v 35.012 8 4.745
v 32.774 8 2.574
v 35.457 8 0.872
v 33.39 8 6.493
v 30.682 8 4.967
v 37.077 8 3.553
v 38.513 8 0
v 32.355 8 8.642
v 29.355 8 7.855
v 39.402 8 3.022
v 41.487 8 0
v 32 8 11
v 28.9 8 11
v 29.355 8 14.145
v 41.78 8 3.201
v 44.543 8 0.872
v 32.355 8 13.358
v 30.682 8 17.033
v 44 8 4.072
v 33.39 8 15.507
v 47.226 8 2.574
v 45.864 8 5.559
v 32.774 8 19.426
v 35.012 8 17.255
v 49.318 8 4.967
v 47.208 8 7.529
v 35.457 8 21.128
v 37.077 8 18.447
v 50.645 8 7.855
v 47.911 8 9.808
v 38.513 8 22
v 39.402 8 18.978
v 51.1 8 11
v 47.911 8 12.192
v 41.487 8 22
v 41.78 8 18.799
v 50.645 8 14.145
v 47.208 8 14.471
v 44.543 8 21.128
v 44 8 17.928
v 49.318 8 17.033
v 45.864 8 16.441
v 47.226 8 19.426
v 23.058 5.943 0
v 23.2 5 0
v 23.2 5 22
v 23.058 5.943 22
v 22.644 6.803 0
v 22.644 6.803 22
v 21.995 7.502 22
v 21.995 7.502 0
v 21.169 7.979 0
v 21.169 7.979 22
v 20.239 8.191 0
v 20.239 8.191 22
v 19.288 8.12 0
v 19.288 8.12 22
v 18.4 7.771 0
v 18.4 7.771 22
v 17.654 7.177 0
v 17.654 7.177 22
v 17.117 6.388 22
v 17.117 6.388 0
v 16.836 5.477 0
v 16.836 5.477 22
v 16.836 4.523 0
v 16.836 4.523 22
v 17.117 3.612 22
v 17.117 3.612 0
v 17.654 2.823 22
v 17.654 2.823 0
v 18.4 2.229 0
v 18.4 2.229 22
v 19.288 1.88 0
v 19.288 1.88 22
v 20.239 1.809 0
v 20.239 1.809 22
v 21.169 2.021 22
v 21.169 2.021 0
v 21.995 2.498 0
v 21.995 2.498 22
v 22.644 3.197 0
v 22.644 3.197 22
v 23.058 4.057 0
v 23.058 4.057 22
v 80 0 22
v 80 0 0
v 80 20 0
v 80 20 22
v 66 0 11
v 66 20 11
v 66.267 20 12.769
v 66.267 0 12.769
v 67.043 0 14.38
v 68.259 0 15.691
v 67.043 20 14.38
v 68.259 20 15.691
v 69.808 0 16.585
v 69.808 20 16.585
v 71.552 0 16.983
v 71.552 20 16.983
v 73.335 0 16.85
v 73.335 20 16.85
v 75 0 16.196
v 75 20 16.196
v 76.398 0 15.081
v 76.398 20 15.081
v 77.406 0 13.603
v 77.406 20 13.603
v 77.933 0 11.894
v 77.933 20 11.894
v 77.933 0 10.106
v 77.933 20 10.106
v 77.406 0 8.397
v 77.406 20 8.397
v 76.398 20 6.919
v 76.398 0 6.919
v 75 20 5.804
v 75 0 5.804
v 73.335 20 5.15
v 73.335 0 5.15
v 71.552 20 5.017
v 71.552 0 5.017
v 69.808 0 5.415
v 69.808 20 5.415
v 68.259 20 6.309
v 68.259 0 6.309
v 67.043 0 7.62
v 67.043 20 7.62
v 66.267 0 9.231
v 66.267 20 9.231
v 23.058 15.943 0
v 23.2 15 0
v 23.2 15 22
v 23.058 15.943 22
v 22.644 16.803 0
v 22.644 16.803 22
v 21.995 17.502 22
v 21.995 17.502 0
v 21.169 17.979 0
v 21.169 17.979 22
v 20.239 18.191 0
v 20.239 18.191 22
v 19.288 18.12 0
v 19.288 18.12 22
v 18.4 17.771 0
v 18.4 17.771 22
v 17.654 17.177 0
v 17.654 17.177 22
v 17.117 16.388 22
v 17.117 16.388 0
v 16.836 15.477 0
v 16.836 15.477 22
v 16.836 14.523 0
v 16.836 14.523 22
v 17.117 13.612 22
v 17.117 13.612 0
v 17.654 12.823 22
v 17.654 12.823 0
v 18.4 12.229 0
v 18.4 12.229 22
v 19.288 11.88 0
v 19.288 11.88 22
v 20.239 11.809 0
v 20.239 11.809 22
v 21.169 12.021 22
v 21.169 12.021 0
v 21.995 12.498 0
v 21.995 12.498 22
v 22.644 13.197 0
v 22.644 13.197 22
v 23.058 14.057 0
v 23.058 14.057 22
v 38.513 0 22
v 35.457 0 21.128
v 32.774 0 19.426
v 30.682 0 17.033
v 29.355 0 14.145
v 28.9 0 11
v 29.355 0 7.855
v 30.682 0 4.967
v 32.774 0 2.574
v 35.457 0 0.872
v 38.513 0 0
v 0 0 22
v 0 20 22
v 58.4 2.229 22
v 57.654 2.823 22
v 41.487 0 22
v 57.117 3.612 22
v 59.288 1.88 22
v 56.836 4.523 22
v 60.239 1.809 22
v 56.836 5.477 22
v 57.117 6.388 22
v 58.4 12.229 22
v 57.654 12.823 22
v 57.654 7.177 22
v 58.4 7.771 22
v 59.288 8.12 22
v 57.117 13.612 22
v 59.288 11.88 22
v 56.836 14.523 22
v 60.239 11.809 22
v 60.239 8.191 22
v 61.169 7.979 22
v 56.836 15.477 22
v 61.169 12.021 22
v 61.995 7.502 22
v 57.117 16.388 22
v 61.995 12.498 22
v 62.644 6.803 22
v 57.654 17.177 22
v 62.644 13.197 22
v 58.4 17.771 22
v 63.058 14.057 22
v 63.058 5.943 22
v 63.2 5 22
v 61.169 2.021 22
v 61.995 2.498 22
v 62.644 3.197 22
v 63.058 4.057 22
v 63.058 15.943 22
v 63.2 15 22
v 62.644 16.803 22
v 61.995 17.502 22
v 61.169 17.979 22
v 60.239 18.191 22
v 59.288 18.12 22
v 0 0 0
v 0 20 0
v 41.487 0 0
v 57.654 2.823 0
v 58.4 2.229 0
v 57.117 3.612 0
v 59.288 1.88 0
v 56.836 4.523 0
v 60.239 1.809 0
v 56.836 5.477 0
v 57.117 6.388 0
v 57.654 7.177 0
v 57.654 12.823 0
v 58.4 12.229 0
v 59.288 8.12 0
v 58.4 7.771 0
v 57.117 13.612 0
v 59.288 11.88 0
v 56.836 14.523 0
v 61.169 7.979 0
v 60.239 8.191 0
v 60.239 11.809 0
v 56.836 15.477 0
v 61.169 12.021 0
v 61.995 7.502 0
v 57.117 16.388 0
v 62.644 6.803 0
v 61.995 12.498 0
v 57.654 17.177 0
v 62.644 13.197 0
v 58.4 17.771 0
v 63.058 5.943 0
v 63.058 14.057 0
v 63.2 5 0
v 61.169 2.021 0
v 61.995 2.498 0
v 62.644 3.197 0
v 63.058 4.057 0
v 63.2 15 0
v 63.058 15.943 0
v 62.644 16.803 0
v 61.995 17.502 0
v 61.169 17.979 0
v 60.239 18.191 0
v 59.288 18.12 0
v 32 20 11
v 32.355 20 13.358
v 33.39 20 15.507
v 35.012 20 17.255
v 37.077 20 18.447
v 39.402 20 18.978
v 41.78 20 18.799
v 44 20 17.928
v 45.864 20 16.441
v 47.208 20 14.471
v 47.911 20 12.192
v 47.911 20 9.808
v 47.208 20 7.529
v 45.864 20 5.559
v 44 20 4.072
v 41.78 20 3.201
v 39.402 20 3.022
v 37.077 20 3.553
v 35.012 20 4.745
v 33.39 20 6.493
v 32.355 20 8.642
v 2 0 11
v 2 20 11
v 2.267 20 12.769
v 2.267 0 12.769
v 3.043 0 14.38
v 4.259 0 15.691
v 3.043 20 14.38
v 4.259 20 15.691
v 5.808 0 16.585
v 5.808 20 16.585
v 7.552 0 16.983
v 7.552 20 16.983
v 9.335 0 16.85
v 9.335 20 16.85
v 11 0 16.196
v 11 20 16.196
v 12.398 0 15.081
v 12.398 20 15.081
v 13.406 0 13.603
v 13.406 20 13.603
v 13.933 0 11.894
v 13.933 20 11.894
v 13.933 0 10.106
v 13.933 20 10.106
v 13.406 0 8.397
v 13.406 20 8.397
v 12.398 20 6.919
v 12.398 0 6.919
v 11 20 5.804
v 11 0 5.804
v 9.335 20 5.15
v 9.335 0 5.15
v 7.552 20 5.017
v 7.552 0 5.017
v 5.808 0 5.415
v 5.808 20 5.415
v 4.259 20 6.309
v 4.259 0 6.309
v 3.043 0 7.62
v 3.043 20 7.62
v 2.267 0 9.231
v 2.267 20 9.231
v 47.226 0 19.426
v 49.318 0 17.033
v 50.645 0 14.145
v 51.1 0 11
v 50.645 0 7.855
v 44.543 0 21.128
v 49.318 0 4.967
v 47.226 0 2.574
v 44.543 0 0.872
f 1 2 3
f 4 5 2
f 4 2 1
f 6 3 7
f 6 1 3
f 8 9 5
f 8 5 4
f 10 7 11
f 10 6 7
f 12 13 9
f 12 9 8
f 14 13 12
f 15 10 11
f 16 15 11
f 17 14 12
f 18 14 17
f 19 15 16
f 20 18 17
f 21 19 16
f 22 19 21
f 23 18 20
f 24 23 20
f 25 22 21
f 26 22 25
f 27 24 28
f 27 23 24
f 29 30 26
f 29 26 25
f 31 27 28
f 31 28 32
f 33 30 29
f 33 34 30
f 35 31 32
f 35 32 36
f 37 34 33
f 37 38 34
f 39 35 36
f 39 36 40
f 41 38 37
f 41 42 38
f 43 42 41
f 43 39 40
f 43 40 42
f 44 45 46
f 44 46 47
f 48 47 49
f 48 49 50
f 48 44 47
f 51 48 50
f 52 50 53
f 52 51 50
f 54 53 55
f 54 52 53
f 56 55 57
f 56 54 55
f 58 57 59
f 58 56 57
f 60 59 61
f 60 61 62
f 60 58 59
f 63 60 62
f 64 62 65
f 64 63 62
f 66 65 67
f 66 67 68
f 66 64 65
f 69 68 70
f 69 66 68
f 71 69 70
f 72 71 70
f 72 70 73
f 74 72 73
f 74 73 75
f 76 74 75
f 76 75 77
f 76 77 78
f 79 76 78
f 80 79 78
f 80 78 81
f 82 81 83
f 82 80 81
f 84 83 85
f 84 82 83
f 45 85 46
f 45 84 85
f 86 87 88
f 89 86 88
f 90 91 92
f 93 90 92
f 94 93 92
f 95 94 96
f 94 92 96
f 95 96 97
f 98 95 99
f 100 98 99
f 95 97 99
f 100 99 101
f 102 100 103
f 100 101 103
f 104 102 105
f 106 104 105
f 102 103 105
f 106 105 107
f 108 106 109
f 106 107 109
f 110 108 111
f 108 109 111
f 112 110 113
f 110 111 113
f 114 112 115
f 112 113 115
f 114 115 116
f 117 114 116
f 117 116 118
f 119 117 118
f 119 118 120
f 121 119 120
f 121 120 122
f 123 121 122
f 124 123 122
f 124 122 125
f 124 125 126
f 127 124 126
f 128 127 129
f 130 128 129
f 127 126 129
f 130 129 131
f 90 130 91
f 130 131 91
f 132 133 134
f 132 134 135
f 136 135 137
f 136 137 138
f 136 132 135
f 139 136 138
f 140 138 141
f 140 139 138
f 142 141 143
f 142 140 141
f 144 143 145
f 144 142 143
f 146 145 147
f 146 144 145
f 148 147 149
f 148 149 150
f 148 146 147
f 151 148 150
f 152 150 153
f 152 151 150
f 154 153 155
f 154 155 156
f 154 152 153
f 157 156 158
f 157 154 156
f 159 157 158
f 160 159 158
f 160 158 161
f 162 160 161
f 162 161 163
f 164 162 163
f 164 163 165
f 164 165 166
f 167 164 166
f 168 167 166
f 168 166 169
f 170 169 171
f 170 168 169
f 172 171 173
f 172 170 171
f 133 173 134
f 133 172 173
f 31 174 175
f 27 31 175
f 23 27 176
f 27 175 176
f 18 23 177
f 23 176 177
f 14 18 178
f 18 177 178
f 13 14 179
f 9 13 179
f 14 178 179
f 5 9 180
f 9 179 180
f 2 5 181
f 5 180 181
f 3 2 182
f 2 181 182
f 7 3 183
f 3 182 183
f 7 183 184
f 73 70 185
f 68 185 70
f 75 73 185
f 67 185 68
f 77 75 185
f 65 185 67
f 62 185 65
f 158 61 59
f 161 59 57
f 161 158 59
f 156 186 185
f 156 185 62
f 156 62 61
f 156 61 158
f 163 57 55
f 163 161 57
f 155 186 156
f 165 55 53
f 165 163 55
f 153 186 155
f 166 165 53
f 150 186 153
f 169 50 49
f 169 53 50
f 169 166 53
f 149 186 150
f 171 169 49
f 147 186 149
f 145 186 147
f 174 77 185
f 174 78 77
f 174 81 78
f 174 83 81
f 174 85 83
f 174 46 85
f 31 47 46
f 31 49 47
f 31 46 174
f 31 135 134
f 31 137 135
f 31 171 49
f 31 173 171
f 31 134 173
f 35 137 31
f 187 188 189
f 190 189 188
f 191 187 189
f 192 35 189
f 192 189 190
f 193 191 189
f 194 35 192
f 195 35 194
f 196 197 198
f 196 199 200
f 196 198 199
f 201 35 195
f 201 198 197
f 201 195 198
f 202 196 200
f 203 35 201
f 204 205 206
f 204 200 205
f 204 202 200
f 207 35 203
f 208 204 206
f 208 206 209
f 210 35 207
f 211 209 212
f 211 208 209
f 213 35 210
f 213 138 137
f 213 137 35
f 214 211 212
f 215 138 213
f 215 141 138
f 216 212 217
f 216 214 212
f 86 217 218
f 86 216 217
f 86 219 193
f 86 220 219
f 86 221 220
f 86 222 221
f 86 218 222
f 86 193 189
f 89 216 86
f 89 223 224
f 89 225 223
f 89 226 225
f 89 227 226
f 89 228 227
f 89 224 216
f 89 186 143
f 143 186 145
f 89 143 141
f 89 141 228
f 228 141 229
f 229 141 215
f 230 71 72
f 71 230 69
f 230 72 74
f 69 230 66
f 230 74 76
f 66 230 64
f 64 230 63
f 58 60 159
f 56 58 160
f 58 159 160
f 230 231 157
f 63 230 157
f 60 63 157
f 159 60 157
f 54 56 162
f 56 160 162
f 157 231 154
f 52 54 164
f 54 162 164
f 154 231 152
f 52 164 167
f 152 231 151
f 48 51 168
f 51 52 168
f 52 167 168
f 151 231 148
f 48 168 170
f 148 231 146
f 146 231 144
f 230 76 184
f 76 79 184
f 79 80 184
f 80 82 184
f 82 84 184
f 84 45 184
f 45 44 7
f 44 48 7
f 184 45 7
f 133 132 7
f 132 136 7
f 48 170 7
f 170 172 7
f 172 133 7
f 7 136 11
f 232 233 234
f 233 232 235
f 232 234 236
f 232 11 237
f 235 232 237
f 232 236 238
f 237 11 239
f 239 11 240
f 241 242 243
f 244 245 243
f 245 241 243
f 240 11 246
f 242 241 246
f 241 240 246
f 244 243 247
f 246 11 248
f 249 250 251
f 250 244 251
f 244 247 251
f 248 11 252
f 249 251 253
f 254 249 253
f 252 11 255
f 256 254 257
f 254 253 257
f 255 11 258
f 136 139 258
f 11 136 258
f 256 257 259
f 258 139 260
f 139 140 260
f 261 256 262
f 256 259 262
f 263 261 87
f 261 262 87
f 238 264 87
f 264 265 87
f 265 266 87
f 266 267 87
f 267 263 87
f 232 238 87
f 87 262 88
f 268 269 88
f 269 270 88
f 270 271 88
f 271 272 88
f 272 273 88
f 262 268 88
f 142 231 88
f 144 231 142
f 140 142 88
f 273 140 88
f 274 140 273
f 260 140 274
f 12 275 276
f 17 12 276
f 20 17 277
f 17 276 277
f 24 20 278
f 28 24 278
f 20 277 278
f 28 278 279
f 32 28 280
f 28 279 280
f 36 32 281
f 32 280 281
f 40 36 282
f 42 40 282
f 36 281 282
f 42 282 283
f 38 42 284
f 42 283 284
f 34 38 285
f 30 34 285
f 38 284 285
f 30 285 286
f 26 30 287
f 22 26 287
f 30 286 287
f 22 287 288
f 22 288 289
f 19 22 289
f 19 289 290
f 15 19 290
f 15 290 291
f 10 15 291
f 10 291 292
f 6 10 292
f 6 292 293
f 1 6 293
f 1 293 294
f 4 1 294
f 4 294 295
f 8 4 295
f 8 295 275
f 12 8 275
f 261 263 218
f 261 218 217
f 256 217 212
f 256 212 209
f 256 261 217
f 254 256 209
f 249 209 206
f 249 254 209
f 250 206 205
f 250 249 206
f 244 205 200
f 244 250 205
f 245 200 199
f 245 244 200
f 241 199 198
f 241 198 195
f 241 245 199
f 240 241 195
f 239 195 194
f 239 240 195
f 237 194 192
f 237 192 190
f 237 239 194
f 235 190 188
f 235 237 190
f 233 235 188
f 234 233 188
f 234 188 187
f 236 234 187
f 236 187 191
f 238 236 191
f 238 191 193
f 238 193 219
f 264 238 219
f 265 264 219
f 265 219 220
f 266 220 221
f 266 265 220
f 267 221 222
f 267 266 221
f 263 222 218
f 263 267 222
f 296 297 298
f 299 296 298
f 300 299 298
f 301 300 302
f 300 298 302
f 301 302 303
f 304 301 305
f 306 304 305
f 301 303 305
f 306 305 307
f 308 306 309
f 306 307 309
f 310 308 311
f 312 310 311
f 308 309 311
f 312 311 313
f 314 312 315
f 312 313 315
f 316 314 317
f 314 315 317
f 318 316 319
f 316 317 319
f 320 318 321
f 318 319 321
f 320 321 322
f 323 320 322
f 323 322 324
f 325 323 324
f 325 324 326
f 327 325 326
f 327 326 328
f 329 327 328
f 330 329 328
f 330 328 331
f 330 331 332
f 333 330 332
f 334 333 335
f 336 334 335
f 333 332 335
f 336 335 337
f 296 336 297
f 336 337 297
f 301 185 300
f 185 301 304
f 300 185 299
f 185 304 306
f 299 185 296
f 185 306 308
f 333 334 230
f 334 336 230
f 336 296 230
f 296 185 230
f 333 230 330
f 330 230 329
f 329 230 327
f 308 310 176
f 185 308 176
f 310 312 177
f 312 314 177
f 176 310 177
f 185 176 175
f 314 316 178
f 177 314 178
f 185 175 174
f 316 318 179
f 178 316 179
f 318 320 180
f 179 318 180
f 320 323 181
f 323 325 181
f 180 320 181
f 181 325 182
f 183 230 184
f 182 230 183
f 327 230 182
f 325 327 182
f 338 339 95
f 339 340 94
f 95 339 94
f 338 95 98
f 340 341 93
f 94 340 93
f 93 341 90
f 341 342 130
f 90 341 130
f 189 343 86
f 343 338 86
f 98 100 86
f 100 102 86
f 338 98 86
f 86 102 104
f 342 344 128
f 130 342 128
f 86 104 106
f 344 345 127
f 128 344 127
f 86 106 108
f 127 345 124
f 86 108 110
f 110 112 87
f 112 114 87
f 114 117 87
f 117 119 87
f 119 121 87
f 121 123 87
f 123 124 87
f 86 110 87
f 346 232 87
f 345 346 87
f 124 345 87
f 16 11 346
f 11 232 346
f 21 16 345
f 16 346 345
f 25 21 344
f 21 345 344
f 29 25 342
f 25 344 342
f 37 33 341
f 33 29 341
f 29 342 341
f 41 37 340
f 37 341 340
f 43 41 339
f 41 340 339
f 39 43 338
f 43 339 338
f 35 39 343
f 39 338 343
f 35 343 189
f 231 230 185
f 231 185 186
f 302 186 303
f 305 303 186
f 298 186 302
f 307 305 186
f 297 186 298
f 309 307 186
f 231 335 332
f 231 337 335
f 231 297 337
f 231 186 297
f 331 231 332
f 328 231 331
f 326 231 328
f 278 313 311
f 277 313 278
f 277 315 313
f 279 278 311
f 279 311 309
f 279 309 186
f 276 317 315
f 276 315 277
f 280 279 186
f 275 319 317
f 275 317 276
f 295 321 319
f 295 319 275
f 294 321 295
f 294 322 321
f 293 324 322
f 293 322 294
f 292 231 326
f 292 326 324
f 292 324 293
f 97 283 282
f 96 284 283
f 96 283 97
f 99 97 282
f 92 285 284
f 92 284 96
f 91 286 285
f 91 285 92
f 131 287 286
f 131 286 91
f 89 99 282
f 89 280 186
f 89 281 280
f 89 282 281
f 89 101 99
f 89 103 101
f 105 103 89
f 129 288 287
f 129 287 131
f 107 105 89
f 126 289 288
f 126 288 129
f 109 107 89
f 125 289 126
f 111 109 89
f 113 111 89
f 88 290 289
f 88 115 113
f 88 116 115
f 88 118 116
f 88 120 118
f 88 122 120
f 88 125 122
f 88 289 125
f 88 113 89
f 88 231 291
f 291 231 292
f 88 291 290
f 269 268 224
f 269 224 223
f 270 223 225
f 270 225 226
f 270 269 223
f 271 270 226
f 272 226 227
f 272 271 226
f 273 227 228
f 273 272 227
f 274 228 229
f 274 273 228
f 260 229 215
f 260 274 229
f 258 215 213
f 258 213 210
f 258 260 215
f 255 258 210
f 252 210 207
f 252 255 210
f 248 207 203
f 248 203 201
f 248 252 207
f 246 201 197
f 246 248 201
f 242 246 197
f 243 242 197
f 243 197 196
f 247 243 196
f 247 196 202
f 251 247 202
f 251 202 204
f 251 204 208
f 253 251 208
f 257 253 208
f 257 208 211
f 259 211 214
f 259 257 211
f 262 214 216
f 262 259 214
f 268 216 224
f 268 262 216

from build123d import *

# Parameters (mm, degrees)
SKETCH_W        = 80
SKETCH_H        = 20
SKETCH_R        = 3.2
PAD_DEPTH       = 22
SKETCH001_R     = 11.1
POCKET_DEPTH    = 8
SKETCH002_R     = 6
SKETCH002_R_2   = 8
POCKET001_DEPTH = 20


with BuildPart() as part:
    # Sketch → Pad (new body)
    with BuildSketch(Plane.XY):
        with Locations((40, 10)):
            Rectangle(SKETCH_W, SKETCH_H)
        with Locations((20, 15)):
            Circle(SKETCH_R, mode=Mode.SUBTRACT)
        with Locations((20, 5)):
            Circle(SKETCH_R, mode=Mode.SUBTRACT)
        with Locations((60, 15)):
            Circle(SKETCH_R, mode=Mode.SUBTRACT)
        with Locations((60, 5)):
            Circle(SKETCH_R, mode=Mode.SUBTRACT)
    extrude(amount=PAD_DEPTH)

    # Sketch001 (on Face3 of Pad) → Pocket (cut)
    with BuildSketch(Plane.XZ):
        with Locations((40, 11)):
            Circle(SKETCH001_R)
    extrude(amount=-POCKET_DEPTH, mode=Mode.SUBTRACT)

    # Sketch002 (on Face1 of Pocket) → Pocket001 (cut)
    with BuildSketch(Plane(origin=(0, 20, 0), x_dir=(-1, 0, 0), z_dir=(0, 1, 0))):
        with Locations((-72, 11)):
            Circle(SKETCH002_R)
        with Locations((-8, 11)):
            Circle(SKETCH002_R)
        with Locations((-40, 11)):
            Circle(SKETCH002_R_2)
    extrude(amount=-POCKET001_DEPTH, mode=Mode.SUBTRACT)


solid = part.part
